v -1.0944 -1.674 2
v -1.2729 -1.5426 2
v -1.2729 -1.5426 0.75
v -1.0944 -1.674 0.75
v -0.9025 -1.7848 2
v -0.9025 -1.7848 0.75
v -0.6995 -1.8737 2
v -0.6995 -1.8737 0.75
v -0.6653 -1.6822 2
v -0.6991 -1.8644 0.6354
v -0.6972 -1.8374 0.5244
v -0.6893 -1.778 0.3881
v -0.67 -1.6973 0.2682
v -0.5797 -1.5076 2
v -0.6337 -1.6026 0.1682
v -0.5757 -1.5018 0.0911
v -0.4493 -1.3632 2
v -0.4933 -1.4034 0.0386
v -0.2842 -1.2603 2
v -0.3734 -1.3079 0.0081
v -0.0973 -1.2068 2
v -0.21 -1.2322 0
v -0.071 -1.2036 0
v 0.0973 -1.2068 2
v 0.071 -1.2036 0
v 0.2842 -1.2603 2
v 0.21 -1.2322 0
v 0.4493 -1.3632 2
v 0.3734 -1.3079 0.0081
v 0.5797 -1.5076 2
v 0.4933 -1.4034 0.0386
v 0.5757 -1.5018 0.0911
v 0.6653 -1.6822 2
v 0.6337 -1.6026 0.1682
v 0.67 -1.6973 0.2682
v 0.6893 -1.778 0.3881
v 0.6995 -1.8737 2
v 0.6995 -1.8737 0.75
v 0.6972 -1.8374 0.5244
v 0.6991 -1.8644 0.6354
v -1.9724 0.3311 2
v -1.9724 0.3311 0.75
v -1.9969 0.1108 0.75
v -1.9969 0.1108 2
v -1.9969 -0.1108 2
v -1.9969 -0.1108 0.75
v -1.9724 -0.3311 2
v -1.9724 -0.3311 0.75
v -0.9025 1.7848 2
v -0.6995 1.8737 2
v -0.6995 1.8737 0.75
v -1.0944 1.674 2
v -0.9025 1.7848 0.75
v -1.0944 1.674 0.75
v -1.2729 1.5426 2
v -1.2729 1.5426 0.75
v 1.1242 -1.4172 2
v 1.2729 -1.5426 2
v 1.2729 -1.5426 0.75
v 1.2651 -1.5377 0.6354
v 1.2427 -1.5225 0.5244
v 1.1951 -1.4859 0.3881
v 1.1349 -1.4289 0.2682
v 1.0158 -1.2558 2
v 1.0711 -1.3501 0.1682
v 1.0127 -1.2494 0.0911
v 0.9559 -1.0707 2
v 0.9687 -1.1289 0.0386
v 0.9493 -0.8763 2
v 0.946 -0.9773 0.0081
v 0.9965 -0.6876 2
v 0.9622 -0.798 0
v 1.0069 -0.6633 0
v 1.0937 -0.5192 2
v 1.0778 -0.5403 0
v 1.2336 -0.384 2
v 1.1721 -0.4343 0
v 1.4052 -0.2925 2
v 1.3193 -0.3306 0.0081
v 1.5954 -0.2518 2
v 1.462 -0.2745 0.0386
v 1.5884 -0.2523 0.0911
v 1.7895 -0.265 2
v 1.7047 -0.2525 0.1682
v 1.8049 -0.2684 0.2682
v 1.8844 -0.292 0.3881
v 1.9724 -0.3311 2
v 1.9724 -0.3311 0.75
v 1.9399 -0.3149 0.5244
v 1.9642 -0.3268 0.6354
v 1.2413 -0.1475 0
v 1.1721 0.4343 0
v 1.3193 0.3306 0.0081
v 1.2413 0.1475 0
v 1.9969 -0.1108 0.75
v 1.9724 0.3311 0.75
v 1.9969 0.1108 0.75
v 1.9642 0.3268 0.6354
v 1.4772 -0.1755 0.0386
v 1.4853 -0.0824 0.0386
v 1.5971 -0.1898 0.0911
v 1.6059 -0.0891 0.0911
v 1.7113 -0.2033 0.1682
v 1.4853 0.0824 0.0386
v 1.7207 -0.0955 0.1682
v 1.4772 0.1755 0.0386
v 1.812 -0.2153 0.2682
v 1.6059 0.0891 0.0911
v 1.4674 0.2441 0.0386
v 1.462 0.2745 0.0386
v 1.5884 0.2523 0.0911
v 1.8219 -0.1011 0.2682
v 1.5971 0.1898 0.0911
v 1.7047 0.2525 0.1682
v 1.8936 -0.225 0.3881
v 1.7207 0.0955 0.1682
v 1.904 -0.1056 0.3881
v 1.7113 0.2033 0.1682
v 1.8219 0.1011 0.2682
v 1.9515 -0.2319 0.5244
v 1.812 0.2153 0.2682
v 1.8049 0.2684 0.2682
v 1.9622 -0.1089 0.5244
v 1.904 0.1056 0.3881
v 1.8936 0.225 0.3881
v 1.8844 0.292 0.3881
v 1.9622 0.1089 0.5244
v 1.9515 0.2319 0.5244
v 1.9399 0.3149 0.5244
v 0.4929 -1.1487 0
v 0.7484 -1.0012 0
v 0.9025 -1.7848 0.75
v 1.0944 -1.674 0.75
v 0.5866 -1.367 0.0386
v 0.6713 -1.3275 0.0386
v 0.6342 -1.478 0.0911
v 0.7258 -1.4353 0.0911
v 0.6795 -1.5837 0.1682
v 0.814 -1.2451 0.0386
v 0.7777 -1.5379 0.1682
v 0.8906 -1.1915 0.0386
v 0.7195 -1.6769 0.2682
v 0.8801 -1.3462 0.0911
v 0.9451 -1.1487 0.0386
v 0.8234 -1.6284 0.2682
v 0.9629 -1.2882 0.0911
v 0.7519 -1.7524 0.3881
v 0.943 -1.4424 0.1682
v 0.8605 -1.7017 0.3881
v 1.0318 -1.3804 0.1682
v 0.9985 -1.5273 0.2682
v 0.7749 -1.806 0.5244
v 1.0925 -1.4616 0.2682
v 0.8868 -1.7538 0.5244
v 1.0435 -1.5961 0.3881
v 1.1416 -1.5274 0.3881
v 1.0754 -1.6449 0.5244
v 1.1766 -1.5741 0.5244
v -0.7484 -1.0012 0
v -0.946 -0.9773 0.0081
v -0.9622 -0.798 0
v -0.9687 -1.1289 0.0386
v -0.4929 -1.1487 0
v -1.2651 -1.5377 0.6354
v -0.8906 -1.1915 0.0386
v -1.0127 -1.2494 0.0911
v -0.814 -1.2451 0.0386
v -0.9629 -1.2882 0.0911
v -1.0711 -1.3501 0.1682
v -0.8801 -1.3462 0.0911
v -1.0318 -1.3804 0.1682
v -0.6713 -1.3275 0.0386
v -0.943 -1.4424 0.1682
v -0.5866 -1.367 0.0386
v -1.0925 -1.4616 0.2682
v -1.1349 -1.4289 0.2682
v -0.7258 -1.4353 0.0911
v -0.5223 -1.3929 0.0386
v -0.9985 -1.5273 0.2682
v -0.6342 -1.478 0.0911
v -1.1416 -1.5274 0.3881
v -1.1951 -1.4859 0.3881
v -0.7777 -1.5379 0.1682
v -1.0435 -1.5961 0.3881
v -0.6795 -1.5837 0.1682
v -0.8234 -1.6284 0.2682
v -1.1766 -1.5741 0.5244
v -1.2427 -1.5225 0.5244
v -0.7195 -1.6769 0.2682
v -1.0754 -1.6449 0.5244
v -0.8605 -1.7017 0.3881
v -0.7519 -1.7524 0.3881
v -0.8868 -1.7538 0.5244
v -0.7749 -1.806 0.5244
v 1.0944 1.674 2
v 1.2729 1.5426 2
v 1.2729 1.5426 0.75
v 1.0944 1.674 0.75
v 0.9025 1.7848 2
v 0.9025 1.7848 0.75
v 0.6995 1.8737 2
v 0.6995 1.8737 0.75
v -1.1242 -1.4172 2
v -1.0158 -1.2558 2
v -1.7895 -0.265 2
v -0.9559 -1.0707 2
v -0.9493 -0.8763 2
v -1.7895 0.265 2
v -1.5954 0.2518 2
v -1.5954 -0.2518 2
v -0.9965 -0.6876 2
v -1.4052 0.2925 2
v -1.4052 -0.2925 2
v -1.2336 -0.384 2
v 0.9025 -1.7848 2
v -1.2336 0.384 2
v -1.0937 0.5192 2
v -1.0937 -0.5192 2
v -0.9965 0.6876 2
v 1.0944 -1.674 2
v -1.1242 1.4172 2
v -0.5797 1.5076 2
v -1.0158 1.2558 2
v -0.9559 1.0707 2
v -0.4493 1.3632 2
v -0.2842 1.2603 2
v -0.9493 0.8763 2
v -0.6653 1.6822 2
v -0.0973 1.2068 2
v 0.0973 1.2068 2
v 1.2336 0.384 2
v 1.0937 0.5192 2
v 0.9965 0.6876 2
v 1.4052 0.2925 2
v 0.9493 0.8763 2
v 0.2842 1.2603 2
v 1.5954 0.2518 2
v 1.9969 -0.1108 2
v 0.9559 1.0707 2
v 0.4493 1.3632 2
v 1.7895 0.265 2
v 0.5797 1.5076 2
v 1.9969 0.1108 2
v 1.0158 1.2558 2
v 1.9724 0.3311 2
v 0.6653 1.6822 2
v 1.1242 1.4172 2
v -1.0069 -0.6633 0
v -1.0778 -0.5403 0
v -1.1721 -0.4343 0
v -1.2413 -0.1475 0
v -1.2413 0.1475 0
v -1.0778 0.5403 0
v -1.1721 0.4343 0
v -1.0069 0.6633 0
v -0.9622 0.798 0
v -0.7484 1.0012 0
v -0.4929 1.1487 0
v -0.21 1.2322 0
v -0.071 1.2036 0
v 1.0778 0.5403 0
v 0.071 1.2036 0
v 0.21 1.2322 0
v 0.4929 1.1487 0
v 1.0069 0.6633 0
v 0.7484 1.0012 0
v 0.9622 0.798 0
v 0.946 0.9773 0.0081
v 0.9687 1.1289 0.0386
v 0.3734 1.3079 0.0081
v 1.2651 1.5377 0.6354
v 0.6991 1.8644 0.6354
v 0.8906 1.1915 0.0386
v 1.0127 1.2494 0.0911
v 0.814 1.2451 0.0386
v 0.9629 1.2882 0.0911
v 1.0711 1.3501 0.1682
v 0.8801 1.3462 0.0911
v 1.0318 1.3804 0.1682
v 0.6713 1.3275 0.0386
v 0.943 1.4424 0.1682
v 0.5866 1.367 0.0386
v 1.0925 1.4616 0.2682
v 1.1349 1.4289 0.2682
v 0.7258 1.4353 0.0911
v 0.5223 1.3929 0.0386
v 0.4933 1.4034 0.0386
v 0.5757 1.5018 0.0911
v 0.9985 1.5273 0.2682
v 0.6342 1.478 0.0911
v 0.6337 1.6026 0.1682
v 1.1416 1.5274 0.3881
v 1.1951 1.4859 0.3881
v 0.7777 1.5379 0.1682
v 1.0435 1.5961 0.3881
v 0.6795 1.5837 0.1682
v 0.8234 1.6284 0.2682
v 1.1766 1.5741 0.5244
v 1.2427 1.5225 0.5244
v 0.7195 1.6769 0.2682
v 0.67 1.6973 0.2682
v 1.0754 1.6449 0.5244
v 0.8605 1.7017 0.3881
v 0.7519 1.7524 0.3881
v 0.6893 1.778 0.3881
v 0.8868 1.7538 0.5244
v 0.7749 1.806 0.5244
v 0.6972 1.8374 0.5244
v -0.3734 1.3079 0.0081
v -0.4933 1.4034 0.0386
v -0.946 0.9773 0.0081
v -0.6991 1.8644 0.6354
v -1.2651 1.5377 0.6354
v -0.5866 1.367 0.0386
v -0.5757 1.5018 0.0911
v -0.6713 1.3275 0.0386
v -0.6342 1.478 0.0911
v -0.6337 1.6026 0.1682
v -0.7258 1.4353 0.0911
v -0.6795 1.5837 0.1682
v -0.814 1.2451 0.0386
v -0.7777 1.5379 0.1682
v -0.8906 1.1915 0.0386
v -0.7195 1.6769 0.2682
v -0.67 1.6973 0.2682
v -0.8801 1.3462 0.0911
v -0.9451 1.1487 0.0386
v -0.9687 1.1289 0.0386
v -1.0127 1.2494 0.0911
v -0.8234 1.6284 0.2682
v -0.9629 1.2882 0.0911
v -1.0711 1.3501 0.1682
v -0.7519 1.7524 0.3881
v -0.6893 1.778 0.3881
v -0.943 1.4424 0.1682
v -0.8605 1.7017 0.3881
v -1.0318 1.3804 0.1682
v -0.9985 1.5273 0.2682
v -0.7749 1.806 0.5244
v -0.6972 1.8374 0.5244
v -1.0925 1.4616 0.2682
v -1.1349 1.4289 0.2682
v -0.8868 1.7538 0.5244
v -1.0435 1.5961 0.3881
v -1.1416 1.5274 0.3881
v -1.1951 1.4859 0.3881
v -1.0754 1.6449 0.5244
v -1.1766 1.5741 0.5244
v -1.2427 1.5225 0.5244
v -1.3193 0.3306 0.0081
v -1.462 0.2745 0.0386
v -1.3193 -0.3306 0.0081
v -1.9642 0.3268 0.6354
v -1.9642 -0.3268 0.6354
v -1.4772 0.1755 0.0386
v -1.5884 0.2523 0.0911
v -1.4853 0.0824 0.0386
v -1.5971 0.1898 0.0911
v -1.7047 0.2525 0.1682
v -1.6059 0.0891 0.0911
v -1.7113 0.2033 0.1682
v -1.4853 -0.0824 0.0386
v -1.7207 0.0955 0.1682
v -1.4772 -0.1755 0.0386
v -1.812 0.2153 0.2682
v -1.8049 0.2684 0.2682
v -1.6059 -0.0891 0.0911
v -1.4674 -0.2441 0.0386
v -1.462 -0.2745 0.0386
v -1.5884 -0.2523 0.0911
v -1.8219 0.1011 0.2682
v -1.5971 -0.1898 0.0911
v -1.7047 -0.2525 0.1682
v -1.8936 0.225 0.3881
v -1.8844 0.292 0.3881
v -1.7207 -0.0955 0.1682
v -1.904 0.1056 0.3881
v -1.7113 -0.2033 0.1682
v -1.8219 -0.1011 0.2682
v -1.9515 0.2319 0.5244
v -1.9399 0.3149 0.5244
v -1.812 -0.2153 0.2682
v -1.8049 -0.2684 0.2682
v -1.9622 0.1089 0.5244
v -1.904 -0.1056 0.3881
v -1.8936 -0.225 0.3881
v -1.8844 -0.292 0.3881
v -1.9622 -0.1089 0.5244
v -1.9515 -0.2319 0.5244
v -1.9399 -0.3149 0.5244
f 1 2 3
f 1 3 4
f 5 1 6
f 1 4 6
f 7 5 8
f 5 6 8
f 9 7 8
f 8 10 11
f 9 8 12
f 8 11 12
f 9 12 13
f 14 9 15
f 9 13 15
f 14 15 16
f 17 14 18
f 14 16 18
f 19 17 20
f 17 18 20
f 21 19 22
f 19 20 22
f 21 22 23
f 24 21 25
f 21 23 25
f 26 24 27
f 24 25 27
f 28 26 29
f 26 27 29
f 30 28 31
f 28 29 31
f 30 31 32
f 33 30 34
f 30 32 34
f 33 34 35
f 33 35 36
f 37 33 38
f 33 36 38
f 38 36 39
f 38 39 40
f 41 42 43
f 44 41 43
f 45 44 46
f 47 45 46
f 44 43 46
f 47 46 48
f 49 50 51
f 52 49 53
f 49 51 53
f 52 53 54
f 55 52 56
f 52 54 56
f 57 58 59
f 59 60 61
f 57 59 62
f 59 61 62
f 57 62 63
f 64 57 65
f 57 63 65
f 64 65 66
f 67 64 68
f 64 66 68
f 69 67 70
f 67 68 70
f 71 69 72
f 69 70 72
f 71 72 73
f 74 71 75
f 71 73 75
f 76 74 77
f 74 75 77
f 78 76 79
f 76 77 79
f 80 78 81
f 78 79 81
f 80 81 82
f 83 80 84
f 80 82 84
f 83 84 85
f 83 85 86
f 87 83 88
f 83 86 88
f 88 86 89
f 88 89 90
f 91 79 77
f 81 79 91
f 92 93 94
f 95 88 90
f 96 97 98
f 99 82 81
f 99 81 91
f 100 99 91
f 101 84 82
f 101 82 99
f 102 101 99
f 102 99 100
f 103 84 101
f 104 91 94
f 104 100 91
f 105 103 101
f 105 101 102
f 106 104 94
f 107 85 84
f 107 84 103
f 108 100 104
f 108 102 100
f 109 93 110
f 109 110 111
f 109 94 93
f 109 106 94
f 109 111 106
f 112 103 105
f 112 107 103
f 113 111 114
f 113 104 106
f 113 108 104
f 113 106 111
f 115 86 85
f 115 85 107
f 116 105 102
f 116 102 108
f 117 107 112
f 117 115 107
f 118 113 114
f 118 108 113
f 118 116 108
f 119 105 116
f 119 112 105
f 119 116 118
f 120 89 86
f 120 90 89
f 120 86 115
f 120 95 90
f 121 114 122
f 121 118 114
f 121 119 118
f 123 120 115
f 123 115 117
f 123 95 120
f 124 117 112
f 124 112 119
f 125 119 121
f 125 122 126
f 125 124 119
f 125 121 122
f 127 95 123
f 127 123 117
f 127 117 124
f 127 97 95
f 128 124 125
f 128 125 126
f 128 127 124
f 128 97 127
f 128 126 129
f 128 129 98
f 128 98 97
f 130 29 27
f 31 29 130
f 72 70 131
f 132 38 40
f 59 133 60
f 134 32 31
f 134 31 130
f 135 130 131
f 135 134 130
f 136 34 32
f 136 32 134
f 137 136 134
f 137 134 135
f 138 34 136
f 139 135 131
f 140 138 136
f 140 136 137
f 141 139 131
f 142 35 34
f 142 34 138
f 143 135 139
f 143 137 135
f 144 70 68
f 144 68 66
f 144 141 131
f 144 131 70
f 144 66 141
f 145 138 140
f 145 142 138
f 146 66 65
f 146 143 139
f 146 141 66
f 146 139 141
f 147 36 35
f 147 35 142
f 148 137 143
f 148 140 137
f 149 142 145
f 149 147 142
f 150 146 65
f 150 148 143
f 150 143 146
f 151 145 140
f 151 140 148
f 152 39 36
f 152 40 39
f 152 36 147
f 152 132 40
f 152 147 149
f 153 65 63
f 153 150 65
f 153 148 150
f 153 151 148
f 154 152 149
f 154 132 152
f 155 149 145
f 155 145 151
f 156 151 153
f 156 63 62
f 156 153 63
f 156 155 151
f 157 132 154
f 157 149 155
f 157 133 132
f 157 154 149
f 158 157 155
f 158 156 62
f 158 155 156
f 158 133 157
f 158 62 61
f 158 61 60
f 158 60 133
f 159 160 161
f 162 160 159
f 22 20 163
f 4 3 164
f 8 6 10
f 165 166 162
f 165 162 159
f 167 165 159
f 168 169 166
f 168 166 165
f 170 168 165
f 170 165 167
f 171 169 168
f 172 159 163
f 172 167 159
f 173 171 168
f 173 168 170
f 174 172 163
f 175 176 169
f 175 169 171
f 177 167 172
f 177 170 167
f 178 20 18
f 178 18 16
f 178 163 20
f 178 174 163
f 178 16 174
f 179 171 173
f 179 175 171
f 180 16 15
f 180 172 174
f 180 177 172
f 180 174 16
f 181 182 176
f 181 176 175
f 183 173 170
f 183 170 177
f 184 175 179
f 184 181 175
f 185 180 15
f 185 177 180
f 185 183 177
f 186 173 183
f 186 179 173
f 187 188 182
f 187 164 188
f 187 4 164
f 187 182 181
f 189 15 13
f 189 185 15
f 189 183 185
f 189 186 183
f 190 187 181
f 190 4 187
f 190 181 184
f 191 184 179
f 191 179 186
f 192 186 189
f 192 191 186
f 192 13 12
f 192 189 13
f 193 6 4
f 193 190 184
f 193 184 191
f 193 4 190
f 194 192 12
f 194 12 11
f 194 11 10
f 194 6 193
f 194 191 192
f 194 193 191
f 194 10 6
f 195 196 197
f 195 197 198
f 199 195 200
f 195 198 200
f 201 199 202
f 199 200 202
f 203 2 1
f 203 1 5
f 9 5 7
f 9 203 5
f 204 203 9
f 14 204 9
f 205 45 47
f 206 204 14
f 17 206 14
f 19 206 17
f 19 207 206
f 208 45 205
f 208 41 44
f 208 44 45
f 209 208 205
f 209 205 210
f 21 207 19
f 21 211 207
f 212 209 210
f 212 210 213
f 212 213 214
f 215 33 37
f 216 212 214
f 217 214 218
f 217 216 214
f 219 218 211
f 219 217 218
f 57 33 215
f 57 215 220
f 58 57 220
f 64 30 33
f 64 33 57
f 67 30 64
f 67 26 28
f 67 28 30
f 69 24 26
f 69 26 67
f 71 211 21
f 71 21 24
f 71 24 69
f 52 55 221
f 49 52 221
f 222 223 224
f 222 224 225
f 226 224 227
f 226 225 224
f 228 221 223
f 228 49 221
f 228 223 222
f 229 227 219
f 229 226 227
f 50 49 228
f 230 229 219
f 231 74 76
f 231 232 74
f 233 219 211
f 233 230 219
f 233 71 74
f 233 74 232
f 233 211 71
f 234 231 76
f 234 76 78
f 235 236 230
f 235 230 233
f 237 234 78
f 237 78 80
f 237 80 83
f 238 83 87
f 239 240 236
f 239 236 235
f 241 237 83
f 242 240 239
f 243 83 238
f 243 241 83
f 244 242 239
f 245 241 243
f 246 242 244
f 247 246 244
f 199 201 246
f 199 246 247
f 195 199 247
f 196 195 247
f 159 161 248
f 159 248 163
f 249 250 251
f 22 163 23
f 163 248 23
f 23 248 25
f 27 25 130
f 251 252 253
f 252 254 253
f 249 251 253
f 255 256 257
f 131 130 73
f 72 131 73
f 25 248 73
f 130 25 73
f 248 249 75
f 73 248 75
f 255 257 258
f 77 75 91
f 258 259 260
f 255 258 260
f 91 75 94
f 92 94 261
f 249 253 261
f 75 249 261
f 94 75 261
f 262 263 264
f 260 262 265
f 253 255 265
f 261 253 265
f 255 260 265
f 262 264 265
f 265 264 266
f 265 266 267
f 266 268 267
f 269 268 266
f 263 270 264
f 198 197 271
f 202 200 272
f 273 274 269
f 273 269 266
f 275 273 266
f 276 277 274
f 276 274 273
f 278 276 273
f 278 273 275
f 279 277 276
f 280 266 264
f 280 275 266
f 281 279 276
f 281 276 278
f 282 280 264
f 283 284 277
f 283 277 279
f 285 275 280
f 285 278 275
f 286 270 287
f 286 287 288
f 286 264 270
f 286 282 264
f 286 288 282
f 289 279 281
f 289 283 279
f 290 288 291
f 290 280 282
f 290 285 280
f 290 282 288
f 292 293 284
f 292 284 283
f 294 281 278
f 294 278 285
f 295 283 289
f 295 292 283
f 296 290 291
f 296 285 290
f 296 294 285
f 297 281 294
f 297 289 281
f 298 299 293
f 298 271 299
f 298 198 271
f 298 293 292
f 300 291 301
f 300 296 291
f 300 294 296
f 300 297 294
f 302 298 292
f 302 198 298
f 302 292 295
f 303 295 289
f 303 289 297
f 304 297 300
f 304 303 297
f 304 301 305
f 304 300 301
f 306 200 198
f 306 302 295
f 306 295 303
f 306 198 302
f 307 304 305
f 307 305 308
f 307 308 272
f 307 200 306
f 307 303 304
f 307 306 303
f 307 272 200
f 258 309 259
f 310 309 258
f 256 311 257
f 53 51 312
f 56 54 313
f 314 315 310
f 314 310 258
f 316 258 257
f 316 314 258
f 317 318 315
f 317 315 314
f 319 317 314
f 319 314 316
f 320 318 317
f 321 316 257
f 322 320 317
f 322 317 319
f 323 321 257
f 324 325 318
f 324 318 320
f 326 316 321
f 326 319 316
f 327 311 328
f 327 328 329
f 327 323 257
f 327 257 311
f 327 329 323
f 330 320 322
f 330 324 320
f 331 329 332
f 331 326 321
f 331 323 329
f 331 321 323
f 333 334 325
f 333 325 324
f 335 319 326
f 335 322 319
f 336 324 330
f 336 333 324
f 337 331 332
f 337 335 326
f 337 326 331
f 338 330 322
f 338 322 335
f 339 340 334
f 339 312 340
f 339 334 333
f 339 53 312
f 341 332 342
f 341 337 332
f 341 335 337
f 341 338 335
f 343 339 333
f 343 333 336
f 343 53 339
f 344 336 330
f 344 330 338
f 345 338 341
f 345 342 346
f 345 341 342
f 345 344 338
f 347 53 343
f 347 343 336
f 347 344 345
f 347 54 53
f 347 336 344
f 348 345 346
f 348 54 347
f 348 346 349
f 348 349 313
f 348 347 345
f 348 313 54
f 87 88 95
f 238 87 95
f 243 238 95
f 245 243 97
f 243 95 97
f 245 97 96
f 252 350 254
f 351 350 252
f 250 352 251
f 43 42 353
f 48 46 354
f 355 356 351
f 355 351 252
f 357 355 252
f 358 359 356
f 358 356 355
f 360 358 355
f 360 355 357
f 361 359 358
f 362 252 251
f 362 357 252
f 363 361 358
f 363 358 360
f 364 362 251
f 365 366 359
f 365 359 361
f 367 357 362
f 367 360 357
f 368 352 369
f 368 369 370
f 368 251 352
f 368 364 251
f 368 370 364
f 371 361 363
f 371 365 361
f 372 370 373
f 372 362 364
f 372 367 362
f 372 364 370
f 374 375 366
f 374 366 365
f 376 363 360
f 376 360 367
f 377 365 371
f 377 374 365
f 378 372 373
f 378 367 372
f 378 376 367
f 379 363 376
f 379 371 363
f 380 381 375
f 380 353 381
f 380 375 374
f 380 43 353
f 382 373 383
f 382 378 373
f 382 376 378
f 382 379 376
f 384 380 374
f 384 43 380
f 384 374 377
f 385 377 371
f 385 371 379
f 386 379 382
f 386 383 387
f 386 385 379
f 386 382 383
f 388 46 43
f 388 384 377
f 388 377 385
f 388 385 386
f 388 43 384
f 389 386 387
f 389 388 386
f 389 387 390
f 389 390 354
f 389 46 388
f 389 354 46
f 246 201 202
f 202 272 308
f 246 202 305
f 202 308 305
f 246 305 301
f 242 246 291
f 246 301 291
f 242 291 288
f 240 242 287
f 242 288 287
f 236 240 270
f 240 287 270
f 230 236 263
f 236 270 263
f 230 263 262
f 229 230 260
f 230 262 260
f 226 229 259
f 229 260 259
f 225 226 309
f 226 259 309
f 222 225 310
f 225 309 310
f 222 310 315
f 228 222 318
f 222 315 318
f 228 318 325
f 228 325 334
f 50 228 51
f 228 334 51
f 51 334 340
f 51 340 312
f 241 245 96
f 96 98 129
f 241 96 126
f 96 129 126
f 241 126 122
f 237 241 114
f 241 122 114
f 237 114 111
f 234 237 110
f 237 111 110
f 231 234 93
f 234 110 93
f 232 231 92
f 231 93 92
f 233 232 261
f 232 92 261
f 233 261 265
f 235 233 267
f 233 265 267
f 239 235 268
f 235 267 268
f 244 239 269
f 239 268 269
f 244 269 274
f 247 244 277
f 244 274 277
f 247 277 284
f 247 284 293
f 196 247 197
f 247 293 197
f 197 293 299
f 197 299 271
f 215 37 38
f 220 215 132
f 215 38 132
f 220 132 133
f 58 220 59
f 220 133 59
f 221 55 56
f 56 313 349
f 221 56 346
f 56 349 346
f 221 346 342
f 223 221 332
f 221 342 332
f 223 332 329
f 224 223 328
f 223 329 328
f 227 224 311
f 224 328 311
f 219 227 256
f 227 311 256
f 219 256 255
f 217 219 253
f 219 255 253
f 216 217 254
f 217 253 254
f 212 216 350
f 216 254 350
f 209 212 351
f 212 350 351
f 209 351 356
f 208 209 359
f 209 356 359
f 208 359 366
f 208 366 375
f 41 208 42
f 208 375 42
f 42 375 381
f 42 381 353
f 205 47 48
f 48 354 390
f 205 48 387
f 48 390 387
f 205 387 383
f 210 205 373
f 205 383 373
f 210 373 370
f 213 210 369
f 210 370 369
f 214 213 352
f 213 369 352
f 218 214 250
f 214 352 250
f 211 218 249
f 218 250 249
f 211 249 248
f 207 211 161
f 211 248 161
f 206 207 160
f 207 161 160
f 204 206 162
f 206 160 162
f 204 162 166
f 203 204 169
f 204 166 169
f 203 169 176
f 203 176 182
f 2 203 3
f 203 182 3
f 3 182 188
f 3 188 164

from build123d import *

# Parameters (mm, degrees)
F1_DEPTH = 2


with BuildPart() as f1:
    # F0 (on Top) → F1 (new body)
    with BuildSketch(Plane.XY):
        with BuildLine():
            ThreePointArc((0.6995051674, 1.8736842105), (0, 1.2), (-0.6995051674, 1.8736842105))
            ThreePointArc((-0.6995051674, 1.8736842105), (-1, 1.7320508076), (-1.2729055413, 1.5426313503))
            ThreePointArc((-1.2729055413, 1.5426313503), (-1.0392304845, 0.6), (-1.9724107087, 0.3310528602))
            ThreePointArc((-1.9724107087, 0.3310528602), (-2, 0), (-1.9724107087, -0.3310528602))
            ThreePointArc((-1.9724107087, -0.3310528602), (-1.0392304845, -0.6), (-1.2729055413, -1.5426313503))
            ThreePointArc((-1.2729055413, -1.5426313503), (-1, -1.7320508076), (-0.6995051674, -1.8736842105))
            ThreePointArc((-0.6995051674, -1.8736842105), (0, -1.2), (0.6995051674, -1.8736842105))
            ThreePointArc((0.6995051674, -1.8736842105), (1, -1.7320508076), (1.2729055413, -1.5426313503))
            ThreePointArc((1.2729055413, -1.5426313503), (1.0392304845, -0.6), (1.9724107087, -0.3310528602))
            ThreePointArc((1.9724107087, -0.3310528602), (2, 0), (1.9724107087, 0.3310528602))
            ThreePointArc((1.9724107087, 0.3310528602), (1.0392304845, 0.6), (1.2729055413, 1.5426313503))
            ThreePointArc((1.2729055413, 1.5426313503), (1, 1.7320508076), (0.6995051674, 1.8736842105))
        make_face()
    extrude(amount=F1_DEPTH)

    # F2 (on Front) → F3 (revolve, cut)
    with BuildSketch(Plane.XZ):
        with BuildLine():
            Line((-2, 0.75), (-2, 0))
            Line((-2, 0), (-1.25, 0))
            ThreePointArc((-1.25, 0), (-1.7803300859, 0.2196699141), (-2, 0.75))
        make_face()
    revolve(axis=Axis((0, 0, 1.2335292995), (0, 0, 1)), mode=Mode.SUBTRACT)


solid = f1.part
